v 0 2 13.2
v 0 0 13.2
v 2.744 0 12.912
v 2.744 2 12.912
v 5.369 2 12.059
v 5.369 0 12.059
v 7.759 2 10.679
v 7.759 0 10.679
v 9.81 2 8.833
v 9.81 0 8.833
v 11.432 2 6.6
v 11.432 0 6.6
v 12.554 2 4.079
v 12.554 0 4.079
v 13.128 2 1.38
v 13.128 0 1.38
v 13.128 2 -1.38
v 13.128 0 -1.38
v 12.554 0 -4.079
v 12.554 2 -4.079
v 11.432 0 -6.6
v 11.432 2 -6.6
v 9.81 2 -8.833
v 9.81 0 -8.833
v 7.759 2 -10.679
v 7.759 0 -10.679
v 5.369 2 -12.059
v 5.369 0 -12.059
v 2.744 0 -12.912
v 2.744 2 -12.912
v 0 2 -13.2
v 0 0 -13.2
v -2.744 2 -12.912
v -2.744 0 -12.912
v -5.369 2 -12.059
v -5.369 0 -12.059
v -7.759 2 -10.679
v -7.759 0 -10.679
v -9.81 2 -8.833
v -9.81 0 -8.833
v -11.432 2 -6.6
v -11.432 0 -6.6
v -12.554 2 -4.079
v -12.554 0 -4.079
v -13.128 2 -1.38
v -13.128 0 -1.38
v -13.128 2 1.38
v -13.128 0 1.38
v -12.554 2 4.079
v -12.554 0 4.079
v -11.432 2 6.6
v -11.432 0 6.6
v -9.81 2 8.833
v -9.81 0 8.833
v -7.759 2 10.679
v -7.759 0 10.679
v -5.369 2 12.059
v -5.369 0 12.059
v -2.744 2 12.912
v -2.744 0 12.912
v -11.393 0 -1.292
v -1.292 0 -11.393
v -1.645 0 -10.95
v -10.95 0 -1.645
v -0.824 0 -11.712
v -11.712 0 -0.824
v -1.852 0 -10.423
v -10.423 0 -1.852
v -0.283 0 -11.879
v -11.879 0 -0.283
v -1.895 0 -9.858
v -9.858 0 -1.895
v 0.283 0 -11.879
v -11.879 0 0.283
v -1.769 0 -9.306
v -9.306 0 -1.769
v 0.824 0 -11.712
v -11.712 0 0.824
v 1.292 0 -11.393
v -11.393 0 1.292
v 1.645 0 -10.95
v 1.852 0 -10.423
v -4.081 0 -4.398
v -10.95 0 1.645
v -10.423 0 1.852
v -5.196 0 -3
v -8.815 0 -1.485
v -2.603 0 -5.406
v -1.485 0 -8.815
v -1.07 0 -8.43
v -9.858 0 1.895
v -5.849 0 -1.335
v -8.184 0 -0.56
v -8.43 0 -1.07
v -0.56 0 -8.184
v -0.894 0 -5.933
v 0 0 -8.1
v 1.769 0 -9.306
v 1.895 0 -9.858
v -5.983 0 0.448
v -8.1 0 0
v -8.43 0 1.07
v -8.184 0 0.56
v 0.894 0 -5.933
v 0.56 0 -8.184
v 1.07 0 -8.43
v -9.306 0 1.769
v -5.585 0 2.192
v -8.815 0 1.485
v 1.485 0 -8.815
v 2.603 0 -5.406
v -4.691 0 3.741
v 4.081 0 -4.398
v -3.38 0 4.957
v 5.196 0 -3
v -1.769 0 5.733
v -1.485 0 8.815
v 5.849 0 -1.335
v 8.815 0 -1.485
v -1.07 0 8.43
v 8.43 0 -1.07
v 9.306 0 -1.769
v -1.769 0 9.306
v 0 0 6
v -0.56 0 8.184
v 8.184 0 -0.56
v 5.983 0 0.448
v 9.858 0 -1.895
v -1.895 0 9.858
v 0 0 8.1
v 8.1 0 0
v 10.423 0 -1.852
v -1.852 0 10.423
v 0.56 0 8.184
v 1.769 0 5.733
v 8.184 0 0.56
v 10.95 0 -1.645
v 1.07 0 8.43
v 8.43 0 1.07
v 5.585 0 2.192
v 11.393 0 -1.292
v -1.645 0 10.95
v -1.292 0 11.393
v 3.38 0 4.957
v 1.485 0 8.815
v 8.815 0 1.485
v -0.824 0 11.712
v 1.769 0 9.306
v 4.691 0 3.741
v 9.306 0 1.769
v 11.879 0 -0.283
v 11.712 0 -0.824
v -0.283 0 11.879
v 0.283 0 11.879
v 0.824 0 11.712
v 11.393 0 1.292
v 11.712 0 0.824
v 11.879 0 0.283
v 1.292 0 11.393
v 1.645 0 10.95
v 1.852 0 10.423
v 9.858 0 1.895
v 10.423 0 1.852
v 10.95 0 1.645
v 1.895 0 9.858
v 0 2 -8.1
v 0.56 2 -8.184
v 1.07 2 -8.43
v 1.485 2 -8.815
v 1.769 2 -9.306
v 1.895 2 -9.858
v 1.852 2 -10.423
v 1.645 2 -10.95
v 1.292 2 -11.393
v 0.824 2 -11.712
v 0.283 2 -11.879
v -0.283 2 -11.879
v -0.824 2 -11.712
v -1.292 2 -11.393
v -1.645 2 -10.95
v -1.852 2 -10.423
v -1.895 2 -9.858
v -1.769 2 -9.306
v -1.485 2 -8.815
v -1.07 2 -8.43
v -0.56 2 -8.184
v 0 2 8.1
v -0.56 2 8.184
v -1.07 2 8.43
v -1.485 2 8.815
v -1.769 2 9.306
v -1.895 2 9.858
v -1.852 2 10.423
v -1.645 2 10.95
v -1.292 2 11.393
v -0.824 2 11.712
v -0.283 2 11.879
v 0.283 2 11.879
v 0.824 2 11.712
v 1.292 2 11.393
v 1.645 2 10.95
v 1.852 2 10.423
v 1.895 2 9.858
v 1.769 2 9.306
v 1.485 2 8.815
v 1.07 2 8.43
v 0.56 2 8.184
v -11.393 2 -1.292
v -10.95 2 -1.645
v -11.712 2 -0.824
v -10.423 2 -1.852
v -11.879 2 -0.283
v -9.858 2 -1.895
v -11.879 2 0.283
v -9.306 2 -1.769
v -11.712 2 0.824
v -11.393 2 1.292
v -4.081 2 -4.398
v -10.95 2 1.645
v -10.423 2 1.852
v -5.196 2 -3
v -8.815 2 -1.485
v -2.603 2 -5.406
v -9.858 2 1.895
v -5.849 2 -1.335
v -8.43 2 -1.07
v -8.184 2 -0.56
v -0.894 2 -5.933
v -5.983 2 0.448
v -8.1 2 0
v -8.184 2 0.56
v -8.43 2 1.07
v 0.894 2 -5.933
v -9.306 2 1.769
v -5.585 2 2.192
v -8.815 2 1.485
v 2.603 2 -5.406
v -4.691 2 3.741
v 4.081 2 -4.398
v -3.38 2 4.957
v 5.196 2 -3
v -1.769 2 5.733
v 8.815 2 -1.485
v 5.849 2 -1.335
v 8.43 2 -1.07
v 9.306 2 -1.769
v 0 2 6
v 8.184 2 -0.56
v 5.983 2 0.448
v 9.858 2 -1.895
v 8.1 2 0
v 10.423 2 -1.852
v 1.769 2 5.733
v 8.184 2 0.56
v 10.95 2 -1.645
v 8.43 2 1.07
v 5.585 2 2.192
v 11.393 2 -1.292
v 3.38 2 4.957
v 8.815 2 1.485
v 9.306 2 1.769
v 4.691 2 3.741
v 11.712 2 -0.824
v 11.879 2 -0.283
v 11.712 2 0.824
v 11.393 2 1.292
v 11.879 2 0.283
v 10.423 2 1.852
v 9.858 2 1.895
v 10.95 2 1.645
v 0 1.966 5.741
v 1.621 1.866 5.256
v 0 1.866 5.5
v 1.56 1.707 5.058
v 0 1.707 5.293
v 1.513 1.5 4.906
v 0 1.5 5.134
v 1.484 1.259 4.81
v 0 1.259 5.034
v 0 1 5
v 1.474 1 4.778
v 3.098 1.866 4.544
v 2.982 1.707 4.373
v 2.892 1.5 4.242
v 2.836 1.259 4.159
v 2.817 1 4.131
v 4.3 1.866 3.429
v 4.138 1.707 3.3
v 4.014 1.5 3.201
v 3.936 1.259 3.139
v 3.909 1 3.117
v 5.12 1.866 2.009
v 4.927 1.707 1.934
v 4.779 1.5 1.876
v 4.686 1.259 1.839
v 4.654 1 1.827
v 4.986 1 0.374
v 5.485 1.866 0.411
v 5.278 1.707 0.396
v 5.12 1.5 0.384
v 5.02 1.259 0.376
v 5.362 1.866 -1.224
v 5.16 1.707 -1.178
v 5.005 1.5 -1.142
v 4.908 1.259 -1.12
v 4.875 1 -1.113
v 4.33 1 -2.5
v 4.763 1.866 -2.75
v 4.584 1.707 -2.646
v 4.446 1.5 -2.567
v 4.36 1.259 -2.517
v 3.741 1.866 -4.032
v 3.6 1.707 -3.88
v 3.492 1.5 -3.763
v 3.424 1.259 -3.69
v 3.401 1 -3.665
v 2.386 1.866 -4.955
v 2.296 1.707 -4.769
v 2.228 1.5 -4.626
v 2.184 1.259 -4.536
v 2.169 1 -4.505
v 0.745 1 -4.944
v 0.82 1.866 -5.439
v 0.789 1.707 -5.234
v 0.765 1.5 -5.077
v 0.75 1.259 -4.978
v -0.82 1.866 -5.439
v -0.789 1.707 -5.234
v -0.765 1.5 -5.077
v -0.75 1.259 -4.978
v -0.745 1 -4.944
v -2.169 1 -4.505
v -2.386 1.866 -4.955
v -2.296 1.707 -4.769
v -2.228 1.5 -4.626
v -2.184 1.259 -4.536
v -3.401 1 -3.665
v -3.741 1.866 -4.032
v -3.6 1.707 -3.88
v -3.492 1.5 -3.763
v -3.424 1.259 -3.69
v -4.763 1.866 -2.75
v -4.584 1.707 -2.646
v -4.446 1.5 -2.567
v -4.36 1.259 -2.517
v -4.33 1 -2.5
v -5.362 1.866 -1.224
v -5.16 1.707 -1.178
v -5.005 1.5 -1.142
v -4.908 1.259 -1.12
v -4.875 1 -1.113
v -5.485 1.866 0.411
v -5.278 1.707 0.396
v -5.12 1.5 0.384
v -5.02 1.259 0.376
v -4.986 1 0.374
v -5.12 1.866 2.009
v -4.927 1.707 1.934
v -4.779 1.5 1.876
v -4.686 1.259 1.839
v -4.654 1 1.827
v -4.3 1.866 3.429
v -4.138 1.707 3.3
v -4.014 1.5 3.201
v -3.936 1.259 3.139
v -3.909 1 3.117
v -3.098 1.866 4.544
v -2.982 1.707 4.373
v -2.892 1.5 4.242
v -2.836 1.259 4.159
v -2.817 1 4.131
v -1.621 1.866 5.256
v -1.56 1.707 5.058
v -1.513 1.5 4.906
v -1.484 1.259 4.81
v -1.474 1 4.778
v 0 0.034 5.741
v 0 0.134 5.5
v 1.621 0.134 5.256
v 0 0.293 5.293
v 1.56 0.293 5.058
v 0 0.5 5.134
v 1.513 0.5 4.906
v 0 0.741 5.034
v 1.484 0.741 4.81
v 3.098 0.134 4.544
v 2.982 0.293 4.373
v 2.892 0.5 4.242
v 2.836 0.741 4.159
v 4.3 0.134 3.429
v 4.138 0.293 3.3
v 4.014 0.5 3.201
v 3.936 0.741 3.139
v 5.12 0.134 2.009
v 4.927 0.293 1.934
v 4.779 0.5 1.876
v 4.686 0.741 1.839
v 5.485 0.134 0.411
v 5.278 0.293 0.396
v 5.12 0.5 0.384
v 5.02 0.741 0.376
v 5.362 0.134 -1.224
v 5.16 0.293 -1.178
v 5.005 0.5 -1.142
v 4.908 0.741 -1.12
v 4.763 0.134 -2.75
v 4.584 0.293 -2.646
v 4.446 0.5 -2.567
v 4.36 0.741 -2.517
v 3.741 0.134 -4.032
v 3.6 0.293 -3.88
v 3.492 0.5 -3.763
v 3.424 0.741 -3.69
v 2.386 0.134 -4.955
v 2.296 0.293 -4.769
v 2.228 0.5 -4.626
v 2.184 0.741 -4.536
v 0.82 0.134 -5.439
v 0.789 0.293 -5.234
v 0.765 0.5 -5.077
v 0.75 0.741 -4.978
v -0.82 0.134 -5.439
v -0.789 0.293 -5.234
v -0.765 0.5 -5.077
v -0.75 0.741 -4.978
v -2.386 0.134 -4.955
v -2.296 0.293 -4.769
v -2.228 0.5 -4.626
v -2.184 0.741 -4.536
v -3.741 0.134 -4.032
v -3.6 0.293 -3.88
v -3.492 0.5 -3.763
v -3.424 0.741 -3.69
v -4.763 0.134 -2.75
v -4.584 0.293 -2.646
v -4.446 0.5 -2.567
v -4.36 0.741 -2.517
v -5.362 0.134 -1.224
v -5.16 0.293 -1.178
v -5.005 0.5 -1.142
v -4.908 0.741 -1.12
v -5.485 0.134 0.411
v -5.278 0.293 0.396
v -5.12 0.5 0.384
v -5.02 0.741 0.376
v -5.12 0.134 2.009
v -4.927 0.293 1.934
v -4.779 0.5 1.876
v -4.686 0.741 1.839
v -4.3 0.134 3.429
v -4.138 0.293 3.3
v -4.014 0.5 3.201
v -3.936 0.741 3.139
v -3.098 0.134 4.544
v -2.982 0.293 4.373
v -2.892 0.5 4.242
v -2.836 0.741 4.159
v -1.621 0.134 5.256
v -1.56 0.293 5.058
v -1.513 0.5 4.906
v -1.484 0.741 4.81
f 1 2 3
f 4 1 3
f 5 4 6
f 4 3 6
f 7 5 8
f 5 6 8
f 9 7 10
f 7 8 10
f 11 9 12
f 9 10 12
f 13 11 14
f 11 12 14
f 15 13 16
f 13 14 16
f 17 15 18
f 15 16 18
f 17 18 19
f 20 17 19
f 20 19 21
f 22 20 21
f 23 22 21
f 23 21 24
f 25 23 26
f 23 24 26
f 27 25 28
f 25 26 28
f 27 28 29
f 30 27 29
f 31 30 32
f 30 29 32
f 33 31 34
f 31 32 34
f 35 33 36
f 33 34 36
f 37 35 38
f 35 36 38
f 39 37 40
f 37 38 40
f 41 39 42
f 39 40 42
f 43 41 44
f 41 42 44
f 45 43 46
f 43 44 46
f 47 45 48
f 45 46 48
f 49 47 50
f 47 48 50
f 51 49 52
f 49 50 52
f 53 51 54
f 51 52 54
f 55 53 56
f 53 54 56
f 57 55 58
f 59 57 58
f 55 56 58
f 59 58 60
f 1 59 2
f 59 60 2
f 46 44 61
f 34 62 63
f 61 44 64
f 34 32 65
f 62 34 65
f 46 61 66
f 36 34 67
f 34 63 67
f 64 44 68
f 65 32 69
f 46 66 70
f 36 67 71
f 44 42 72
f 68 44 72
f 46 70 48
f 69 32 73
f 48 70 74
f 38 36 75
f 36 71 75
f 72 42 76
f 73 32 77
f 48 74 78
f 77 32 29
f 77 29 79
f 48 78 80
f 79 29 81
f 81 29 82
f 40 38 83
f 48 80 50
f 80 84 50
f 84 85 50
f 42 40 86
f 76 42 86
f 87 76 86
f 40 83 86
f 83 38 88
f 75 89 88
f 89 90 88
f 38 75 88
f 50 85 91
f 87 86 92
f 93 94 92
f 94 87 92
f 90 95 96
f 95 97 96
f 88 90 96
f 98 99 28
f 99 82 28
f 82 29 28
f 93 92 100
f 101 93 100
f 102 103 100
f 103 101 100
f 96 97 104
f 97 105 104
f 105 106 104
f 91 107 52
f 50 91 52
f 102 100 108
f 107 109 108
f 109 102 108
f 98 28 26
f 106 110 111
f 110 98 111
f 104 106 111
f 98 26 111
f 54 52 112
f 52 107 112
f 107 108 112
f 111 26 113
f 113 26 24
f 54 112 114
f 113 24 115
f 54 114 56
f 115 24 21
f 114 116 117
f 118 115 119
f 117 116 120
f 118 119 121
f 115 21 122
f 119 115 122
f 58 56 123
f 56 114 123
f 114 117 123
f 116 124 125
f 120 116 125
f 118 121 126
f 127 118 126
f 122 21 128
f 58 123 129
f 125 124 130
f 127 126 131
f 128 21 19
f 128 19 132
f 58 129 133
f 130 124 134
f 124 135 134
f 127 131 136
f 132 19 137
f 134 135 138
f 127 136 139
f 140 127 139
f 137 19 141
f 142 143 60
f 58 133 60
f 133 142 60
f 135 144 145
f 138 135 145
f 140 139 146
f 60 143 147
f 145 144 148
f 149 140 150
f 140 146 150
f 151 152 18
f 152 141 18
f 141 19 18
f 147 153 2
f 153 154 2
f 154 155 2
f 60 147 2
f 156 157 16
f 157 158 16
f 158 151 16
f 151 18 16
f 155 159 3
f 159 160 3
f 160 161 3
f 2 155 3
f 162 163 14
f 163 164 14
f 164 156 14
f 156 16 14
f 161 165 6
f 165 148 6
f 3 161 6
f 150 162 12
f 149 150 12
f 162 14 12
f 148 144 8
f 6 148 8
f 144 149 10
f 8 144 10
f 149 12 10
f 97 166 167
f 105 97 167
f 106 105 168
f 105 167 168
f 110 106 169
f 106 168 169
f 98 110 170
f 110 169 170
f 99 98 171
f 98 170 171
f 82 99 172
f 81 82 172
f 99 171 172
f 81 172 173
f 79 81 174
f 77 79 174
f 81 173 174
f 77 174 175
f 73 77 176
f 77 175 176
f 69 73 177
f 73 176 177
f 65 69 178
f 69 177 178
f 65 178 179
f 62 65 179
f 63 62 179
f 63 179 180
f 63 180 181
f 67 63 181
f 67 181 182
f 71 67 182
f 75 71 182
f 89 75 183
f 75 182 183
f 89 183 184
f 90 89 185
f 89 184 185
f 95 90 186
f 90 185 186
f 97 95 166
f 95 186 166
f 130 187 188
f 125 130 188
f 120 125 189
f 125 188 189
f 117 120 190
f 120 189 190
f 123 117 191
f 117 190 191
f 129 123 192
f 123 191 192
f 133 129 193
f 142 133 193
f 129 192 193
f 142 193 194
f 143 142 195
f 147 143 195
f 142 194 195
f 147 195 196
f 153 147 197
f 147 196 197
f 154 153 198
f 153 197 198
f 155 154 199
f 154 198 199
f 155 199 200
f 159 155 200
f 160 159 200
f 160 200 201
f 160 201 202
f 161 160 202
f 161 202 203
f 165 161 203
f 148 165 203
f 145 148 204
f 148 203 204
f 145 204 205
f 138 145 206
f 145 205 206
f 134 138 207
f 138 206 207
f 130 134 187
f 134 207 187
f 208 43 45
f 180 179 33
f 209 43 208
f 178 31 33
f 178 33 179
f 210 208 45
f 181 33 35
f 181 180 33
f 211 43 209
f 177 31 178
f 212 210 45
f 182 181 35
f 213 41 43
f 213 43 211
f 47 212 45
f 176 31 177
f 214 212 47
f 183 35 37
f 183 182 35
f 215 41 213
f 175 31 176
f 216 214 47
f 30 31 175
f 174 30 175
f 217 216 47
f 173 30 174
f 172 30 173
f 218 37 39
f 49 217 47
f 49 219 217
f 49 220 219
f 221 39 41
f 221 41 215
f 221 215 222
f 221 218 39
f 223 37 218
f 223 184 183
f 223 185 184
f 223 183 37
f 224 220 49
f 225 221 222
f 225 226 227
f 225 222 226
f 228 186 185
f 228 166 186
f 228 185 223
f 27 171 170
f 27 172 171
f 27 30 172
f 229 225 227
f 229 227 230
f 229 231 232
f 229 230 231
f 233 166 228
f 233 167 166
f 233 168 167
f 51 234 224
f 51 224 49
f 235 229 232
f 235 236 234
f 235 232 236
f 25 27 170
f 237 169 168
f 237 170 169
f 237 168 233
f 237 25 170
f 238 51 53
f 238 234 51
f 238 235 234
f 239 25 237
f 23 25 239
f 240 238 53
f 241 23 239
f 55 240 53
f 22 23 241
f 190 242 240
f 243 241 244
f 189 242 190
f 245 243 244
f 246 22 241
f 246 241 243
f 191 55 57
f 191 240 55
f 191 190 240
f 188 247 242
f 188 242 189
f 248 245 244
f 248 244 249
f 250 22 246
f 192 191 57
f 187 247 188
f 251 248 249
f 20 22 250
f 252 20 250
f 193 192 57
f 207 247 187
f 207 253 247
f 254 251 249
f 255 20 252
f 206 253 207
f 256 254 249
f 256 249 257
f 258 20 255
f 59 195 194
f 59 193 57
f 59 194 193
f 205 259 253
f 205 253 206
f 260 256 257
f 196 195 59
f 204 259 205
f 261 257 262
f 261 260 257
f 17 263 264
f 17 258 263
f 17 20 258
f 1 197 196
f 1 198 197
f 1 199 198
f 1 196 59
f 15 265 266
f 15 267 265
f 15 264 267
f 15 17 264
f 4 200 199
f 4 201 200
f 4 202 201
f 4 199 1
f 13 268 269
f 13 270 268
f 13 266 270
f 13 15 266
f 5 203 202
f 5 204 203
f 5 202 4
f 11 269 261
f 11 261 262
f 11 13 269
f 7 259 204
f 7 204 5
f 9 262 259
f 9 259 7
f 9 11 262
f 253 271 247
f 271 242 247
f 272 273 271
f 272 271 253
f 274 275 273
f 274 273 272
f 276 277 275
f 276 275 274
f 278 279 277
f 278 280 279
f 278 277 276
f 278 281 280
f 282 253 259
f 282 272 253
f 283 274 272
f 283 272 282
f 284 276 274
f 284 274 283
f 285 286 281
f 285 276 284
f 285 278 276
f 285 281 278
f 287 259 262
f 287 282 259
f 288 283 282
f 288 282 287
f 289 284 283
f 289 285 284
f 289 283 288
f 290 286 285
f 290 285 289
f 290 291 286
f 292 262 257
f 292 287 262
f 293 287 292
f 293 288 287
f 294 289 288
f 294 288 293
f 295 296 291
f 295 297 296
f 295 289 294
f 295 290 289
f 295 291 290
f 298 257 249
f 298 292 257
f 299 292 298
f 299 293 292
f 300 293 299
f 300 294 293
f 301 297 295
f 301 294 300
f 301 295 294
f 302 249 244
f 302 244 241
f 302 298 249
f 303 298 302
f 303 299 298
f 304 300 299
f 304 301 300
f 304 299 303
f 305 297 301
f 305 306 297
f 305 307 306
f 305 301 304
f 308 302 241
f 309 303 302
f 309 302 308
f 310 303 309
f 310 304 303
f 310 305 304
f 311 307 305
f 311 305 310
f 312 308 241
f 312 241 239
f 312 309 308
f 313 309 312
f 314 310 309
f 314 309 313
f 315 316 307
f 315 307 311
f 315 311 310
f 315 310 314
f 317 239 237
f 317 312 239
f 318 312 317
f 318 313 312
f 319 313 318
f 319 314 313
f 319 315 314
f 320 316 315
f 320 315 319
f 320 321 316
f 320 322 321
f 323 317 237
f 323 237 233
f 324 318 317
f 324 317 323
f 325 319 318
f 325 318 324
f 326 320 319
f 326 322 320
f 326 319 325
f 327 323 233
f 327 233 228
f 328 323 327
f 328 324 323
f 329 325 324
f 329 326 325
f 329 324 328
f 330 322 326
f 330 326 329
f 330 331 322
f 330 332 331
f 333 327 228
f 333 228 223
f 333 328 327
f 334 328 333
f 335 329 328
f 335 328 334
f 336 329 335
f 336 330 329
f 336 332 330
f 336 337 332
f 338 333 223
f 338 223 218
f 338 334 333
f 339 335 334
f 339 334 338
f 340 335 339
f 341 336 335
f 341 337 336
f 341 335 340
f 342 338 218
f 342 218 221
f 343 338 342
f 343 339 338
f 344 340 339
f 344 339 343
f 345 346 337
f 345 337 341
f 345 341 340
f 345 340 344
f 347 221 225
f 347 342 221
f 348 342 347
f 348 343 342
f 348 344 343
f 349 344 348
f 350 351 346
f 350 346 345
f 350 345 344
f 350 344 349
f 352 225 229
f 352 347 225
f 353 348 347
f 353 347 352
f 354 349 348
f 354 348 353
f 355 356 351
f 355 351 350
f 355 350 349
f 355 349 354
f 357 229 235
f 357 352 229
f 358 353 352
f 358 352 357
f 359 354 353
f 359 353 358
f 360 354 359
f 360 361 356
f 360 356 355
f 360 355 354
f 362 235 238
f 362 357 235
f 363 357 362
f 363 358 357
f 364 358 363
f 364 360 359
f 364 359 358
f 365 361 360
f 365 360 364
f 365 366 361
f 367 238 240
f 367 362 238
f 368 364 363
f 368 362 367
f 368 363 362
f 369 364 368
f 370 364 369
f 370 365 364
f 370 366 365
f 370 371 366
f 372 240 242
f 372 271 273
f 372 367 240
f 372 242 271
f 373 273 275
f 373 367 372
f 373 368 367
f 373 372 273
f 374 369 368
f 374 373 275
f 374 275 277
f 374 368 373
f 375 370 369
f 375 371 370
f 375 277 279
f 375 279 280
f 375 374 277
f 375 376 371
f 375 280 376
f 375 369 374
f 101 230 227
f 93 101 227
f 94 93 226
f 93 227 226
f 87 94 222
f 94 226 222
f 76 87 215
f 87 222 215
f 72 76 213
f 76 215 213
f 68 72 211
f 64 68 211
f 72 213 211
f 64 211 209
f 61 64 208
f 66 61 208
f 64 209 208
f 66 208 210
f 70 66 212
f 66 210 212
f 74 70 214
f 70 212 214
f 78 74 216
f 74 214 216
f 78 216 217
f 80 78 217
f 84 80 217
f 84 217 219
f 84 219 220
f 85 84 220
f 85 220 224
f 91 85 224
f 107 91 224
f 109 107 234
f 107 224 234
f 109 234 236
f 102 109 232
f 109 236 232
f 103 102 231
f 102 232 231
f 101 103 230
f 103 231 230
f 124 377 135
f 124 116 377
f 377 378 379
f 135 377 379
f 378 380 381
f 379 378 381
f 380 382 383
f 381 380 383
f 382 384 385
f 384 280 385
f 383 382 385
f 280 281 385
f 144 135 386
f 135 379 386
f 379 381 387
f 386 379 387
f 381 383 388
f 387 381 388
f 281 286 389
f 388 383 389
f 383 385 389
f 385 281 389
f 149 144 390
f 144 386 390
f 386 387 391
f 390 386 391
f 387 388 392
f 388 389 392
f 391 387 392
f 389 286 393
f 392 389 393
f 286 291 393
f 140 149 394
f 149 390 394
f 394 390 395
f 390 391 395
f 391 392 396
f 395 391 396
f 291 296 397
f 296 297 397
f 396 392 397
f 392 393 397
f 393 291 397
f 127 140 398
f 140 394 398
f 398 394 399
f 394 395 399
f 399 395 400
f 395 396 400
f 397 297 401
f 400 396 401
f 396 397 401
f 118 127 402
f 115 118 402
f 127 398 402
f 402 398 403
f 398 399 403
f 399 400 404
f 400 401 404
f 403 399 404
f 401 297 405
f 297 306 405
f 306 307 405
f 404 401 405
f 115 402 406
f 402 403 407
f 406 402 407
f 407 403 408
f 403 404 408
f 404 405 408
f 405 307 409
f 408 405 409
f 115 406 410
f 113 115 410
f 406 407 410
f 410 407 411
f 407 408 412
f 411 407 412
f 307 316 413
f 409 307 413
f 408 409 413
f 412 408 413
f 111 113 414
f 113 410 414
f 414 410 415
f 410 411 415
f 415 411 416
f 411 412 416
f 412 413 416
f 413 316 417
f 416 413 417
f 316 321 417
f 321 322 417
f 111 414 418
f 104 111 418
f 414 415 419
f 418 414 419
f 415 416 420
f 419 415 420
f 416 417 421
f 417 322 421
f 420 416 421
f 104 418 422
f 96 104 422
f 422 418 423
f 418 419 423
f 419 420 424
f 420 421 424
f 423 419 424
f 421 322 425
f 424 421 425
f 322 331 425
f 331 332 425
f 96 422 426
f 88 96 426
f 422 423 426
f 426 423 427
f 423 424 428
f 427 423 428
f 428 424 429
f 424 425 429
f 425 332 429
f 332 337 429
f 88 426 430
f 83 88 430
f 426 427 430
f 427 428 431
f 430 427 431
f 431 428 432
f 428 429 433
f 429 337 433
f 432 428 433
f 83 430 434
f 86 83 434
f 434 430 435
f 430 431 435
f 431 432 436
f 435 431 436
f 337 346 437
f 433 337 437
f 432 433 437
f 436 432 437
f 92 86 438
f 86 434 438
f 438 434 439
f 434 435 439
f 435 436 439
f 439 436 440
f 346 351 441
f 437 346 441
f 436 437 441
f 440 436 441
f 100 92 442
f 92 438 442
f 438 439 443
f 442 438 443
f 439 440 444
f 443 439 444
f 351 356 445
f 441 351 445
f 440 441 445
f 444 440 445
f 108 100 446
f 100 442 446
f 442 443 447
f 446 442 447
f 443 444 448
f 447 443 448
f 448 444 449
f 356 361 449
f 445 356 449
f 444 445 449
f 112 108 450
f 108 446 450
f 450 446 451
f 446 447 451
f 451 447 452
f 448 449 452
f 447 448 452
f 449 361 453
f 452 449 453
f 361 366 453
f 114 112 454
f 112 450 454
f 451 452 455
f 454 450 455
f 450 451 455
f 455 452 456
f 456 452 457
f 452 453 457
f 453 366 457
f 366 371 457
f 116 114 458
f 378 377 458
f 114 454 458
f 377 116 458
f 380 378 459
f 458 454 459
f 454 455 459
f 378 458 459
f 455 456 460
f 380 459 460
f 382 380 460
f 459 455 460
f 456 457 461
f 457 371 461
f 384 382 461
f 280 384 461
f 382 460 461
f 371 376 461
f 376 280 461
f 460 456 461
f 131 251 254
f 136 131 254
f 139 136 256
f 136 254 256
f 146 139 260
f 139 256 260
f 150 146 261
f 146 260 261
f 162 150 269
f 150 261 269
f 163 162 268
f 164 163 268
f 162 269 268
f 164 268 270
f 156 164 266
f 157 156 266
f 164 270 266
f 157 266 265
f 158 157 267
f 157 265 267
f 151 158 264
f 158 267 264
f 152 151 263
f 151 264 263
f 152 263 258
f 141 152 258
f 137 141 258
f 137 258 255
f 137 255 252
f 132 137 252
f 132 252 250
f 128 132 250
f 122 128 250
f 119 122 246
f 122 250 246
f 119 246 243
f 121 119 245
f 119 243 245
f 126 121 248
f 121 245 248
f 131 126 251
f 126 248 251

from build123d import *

# Parameters (mm, degrees)
SKETCH2_R           = 13.2
BOSS_EXTRUDE1_DEPTH = 2
SKETCH3_R           = 1.9
CUT_EXTRUDE1_DEPTH  = 2
SKETCH4_R           = 5
CUT_EXTRUDE2_DEPTH  = 2
CIRPATTERN1_COUNT   = 4
FILLET2_R           = 1


with BuildPart() as part:
    # Sketch2 → Boss-Extrude1 (new body)
    with BuildSketch(Plane(origin=(0, 0, 0), x_dir=(1, 0, 0), z_dir=(0, 1, 0))):
        with Locations(Location((0, 0, 0), (0, 0, 270))):
            Circle(SKETCH2_R)
    extrude(amount=BOSS_EXTRUDE1_DEPTH)

    # Sketch3 → Cut-Extrude1 (cut)
    with BuildSketch(Plane(origin=(0, 2, 0), x_dir=(1, 0, 0), z_dir=(0, 1, 0))):
        with Locations(Location((0, 10, 0), (0, 0, 270))):
            Circle(SKETCH3_R)
    cut_extrude1 = extrude(amount=-CUT_EXTRUDE1_DEPTH, mode=Mode.SUBTRACT)

    # Sketch4 → Cut-Extrude2 (cut)
    with BuildSketch(Plane(origin=(0, 2, 0), x_dir=(1, 0, 0), z_dir=(0, 1, 0))):
        with Locations(Location((0, 0, 0), (0, 0, 270))):
            Circle(SKETCH4_R)
    extrude(amount=-CUT_EXTRUDE2_DEPTH, mode=Mode.SUBTRACT)

    # CirPattern1: Cut-Extrude1 ×4 about axis
    cirpattern1_axis = Axis((0, 0, 0), (0, 1, 0))
    for i in range(1, CIRPATTERN1_COUNT):
        add(cut_extrude1.rotate(cirpattern1_axis, i * 360 / CIRPATTERN1_COUNT), mode=Mode.SUBTRACT)

    # Fillet2
    fillet2_edges = [part.edges().sort_by_distance(p)[0] for p in [
        (0, 0, -5),
        (0, 2, -5),
    ]]
    fillet(fillet2_edges, radius=FILLET2_R - 0.0001)  # a hair under: the kernel refuses the full size


solid = part.part
